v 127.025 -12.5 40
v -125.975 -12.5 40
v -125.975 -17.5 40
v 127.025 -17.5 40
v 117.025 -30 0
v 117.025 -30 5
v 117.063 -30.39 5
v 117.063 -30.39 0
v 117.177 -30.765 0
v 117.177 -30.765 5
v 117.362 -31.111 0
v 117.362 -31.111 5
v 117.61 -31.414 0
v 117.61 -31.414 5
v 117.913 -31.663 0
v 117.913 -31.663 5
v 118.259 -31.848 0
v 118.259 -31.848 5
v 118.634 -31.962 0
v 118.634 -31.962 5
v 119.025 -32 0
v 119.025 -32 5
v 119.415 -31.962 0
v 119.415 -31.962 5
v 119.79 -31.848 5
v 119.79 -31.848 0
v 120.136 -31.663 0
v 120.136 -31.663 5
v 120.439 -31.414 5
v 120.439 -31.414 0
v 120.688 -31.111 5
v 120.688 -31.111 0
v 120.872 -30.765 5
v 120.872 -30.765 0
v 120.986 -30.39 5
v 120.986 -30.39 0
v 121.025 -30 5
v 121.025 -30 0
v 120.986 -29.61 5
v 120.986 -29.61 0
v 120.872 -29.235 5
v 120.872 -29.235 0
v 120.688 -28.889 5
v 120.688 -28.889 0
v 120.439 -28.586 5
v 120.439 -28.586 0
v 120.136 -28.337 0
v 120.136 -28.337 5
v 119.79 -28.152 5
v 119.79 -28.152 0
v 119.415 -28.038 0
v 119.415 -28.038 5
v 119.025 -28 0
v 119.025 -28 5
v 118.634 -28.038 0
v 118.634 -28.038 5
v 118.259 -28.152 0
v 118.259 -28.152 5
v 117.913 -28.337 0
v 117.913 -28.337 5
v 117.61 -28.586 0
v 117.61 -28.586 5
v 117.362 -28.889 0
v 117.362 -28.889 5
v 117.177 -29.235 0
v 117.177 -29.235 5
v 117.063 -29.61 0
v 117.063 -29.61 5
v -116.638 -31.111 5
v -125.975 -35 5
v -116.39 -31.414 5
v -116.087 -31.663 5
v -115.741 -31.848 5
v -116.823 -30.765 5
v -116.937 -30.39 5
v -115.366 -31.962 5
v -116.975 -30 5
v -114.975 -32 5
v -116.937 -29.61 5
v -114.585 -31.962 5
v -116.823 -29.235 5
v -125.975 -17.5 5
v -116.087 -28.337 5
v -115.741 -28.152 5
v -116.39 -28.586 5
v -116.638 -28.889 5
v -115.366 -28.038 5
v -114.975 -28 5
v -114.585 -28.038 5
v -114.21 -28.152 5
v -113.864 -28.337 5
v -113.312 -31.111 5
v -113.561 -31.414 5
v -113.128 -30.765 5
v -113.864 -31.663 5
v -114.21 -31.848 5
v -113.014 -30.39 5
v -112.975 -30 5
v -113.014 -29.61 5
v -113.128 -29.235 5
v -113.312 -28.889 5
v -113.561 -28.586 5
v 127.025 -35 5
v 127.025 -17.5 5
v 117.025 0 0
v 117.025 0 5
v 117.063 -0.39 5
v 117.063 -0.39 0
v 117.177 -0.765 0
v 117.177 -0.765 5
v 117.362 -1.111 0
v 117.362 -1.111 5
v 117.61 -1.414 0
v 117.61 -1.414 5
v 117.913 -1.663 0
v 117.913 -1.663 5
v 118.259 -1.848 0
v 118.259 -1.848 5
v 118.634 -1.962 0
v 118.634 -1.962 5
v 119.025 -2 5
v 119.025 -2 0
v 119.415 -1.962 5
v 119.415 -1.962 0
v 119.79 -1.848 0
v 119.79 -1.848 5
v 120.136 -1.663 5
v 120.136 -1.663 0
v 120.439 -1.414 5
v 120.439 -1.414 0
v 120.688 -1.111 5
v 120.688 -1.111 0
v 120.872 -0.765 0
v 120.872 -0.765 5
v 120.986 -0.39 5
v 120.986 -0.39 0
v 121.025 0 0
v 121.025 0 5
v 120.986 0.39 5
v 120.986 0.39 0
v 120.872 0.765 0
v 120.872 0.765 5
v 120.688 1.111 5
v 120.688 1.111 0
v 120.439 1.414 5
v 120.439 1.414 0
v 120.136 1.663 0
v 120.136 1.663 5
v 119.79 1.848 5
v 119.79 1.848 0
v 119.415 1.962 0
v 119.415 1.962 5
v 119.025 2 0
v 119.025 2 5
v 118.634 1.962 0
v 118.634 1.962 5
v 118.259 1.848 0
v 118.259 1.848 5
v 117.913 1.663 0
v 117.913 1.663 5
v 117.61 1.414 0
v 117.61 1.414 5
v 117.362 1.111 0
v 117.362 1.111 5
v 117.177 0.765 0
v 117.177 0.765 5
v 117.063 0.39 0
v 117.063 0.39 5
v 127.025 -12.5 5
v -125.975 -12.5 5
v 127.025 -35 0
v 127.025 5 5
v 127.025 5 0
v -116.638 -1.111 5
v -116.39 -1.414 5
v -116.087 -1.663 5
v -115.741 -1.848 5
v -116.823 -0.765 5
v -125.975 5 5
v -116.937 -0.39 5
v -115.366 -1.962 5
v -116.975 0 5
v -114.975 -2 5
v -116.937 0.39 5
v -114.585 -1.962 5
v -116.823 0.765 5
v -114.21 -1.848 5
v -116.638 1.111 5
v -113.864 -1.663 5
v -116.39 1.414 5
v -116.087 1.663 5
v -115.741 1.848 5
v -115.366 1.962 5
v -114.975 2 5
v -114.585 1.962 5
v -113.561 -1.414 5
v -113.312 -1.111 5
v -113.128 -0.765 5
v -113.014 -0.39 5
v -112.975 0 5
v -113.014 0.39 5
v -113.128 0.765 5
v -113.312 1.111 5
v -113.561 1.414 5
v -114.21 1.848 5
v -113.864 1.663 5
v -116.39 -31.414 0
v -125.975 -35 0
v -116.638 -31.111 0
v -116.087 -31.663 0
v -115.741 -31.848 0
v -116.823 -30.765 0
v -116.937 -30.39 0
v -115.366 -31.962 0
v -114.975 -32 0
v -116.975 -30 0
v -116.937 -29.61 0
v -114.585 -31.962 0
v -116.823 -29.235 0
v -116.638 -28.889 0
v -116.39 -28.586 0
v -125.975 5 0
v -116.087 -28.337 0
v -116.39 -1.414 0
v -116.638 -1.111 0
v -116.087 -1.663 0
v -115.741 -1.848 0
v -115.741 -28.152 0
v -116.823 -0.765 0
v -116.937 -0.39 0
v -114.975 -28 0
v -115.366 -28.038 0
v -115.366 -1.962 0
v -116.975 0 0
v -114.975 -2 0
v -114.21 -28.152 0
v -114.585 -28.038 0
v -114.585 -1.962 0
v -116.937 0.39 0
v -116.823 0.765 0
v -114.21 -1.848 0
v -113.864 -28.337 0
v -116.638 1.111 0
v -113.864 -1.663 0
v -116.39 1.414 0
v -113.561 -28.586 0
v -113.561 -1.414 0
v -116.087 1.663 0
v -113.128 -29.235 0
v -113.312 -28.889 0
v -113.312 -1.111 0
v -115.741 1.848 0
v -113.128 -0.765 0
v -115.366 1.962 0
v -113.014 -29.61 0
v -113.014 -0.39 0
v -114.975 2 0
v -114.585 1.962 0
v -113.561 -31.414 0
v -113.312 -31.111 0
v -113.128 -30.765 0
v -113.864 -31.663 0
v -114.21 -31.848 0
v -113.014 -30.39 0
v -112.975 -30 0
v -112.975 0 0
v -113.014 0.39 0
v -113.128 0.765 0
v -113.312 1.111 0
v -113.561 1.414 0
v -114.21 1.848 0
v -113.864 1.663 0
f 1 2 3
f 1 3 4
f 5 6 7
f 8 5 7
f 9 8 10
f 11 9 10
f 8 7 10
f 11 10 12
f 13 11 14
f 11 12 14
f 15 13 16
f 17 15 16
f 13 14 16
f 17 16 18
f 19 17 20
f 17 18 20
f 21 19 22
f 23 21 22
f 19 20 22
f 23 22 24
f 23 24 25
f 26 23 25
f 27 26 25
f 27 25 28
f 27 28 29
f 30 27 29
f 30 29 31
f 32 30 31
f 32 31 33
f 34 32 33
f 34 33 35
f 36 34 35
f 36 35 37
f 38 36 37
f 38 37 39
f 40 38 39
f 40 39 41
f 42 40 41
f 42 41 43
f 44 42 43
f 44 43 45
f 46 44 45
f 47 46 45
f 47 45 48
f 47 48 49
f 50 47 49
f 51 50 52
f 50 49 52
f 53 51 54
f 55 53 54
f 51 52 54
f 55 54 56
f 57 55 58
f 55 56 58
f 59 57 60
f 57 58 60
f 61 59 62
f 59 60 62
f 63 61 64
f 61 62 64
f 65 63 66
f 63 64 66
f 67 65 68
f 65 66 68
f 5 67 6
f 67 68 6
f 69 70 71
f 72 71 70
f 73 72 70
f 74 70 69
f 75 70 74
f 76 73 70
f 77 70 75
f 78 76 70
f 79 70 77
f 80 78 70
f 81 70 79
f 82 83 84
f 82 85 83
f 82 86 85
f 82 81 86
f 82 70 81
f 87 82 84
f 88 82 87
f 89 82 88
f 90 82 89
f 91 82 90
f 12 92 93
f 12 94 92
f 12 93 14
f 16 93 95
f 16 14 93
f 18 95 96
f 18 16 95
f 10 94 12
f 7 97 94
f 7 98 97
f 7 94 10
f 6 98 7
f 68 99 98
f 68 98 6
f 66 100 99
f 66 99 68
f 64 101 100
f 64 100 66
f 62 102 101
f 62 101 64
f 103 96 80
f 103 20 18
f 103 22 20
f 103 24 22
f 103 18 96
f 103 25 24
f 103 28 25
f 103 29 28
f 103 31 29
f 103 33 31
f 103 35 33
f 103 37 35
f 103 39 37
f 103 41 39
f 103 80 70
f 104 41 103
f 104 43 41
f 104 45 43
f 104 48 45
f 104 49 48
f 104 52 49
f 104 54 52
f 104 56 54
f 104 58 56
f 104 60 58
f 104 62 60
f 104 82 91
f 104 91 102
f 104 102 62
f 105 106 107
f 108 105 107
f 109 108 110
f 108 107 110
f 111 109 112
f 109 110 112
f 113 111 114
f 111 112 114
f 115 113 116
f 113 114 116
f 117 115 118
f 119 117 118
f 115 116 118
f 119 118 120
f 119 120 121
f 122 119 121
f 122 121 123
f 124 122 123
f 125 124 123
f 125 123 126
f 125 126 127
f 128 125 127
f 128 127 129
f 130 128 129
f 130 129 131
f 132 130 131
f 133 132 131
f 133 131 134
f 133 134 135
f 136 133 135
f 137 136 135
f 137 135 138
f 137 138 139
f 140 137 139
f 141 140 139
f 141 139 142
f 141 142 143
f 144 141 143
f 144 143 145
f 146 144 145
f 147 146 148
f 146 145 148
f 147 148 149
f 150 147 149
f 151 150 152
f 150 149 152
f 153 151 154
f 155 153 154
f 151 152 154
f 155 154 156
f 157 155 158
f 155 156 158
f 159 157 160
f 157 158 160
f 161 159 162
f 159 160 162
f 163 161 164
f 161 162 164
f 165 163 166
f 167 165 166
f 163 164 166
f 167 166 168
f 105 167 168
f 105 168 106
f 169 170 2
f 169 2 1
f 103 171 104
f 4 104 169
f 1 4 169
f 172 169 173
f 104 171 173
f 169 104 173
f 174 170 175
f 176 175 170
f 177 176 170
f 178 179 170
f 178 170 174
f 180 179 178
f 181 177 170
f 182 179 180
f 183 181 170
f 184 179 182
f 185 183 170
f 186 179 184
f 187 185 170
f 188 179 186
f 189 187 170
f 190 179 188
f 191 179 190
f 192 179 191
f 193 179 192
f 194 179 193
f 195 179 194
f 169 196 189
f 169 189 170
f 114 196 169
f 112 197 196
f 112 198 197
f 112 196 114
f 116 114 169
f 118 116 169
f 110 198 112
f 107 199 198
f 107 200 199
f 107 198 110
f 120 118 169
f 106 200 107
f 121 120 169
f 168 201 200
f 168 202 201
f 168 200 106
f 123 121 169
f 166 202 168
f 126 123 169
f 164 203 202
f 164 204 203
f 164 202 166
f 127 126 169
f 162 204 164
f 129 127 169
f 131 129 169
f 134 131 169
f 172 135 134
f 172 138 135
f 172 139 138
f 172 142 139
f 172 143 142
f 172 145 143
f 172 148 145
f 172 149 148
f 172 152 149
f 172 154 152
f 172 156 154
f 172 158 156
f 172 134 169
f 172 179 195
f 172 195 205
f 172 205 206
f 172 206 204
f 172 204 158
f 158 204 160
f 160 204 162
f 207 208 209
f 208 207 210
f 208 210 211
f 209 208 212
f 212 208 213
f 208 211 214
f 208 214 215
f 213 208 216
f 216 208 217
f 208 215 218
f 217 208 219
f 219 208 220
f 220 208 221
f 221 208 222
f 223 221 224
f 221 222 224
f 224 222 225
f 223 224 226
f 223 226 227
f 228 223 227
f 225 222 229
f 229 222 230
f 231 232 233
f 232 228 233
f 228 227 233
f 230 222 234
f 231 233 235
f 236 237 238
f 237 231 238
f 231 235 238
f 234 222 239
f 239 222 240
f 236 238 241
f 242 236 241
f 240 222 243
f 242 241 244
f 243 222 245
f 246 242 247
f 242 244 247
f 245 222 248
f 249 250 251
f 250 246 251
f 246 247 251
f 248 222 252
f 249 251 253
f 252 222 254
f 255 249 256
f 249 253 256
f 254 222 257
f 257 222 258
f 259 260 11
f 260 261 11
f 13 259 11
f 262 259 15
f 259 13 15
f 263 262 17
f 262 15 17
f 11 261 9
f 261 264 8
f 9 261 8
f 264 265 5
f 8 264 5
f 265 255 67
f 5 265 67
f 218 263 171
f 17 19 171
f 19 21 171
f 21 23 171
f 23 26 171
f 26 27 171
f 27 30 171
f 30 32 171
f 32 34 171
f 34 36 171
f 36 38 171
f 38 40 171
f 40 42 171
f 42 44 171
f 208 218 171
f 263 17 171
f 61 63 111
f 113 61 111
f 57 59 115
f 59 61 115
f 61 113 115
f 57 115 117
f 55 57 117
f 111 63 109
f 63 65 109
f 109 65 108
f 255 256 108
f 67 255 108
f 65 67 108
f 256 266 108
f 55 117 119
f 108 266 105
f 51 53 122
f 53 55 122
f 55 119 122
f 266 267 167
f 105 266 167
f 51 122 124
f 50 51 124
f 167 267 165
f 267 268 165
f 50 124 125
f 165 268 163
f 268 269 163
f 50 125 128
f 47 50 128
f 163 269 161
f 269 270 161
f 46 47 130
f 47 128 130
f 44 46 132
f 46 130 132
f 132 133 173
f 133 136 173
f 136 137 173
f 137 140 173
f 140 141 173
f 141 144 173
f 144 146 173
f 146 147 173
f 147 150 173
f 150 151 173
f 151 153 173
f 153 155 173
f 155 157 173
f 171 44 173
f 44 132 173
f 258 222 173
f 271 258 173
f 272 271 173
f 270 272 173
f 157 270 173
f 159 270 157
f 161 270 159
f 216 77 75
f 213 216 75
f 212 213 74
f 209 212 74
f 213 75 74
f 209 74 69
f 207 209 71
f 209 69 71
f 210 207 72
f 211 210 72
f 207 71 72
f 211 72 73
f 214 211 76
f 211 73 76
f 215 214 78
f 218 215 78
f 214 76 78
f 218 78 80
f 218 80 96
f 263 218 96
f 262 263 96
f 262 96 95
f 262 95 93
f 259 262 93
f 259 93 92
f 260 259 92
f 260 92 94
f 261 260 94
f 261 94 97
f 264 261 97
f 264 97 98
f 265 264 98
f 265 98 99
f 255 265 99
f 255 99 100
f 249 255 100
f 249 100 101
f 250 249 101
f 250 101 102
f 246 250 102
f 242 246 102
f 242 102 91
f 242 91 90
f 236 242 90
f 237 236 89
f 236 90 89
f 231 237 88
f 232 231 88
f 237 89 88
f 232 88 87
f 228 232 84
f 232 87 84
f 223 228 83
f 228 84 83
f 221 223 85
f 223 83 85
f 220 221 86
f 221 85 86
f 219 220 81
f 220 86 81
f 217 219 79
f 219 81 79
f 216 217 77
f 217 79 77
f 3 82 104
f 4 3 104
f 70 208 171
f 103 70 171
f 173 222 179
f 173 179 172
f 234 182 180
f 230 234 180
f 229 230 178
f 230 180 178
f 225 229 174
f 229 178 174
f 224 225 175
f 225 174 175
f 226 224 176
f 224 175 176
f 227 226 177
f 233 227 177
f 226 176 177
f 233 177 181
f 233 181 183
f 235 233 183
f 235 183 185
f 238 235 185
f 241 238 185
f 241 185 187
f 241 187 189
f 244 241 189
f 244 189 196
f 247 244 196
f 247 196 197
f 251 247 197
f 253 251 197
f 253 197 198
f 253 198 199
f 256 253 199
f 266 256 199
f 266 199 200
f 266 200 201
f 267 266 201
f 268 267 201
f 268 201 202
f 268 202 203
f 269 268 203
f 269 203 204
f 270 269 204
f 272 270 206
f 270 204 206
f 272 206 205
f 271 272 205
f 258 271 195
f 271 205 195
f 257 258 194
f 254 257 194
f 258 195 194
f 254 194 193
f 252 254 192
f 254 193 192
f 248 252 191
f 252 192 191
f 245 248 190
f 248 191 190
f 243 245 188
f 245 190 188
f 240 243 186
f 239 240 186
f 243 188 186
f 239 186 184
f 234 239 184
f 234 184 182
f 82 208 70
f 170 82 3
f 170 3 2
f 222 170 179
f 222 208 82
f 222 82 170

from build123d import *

# Parameters (mm, degrees)
F0_W     = 253
F0_H     = 17.5
F1_DEPTH = 5
F2_D     = 4
F0_H_2   = 5
F3_DEPTH = 40
F4_DEPTH = 5
F5_D     = 4


with BuildPart() as f1:
    # F0 (on Top) → F1 (new body)
    with BuildSketch(Plane.XY):
        with Locations((0.5246251822, -26.25)):
            Rectangle(F0_W, F0_H)
    extrude(amount=F1_DEPTH)

    # F2 (through all)
    with Locations(Plane(origin=(0, 0, 0), x_dir=(1, 0, 0), z_dir=(0, 0, -1))):
        with Locations((-114.9753748178, 0), (-114.9753748178, 30), (119.0246251822, 30), (119.0246251822, 0)):
            Hole(F2_D / 2)

    # F0 (on Top) → F3 (join)
    with BuildSketch(Plane.XY):
        with Locations((0.5246251822, -15)):
            Rectangle(F0_W, F0_H_2)
    extrude(amount=F3_DEPTH)

    # F0 (on Top) → F4 (join)
    with BuildSketch(Plane.XY):
        with Locations((0.5246251822, -3.75)):
            Rectangle(F0_W, F0_H)
    extrude(amount=F4_DEPTH)

    # F5 (through all)
    with Locations(Plane(origin=(0, 0, 0), x_dir=(1, 0, 0), z_dir=(0, 0, -1))):
        with Locations((-114.9753748178, 0), (119.0246251822, 0)):
            Hole(F5_D / 2)


solid = f1.part
